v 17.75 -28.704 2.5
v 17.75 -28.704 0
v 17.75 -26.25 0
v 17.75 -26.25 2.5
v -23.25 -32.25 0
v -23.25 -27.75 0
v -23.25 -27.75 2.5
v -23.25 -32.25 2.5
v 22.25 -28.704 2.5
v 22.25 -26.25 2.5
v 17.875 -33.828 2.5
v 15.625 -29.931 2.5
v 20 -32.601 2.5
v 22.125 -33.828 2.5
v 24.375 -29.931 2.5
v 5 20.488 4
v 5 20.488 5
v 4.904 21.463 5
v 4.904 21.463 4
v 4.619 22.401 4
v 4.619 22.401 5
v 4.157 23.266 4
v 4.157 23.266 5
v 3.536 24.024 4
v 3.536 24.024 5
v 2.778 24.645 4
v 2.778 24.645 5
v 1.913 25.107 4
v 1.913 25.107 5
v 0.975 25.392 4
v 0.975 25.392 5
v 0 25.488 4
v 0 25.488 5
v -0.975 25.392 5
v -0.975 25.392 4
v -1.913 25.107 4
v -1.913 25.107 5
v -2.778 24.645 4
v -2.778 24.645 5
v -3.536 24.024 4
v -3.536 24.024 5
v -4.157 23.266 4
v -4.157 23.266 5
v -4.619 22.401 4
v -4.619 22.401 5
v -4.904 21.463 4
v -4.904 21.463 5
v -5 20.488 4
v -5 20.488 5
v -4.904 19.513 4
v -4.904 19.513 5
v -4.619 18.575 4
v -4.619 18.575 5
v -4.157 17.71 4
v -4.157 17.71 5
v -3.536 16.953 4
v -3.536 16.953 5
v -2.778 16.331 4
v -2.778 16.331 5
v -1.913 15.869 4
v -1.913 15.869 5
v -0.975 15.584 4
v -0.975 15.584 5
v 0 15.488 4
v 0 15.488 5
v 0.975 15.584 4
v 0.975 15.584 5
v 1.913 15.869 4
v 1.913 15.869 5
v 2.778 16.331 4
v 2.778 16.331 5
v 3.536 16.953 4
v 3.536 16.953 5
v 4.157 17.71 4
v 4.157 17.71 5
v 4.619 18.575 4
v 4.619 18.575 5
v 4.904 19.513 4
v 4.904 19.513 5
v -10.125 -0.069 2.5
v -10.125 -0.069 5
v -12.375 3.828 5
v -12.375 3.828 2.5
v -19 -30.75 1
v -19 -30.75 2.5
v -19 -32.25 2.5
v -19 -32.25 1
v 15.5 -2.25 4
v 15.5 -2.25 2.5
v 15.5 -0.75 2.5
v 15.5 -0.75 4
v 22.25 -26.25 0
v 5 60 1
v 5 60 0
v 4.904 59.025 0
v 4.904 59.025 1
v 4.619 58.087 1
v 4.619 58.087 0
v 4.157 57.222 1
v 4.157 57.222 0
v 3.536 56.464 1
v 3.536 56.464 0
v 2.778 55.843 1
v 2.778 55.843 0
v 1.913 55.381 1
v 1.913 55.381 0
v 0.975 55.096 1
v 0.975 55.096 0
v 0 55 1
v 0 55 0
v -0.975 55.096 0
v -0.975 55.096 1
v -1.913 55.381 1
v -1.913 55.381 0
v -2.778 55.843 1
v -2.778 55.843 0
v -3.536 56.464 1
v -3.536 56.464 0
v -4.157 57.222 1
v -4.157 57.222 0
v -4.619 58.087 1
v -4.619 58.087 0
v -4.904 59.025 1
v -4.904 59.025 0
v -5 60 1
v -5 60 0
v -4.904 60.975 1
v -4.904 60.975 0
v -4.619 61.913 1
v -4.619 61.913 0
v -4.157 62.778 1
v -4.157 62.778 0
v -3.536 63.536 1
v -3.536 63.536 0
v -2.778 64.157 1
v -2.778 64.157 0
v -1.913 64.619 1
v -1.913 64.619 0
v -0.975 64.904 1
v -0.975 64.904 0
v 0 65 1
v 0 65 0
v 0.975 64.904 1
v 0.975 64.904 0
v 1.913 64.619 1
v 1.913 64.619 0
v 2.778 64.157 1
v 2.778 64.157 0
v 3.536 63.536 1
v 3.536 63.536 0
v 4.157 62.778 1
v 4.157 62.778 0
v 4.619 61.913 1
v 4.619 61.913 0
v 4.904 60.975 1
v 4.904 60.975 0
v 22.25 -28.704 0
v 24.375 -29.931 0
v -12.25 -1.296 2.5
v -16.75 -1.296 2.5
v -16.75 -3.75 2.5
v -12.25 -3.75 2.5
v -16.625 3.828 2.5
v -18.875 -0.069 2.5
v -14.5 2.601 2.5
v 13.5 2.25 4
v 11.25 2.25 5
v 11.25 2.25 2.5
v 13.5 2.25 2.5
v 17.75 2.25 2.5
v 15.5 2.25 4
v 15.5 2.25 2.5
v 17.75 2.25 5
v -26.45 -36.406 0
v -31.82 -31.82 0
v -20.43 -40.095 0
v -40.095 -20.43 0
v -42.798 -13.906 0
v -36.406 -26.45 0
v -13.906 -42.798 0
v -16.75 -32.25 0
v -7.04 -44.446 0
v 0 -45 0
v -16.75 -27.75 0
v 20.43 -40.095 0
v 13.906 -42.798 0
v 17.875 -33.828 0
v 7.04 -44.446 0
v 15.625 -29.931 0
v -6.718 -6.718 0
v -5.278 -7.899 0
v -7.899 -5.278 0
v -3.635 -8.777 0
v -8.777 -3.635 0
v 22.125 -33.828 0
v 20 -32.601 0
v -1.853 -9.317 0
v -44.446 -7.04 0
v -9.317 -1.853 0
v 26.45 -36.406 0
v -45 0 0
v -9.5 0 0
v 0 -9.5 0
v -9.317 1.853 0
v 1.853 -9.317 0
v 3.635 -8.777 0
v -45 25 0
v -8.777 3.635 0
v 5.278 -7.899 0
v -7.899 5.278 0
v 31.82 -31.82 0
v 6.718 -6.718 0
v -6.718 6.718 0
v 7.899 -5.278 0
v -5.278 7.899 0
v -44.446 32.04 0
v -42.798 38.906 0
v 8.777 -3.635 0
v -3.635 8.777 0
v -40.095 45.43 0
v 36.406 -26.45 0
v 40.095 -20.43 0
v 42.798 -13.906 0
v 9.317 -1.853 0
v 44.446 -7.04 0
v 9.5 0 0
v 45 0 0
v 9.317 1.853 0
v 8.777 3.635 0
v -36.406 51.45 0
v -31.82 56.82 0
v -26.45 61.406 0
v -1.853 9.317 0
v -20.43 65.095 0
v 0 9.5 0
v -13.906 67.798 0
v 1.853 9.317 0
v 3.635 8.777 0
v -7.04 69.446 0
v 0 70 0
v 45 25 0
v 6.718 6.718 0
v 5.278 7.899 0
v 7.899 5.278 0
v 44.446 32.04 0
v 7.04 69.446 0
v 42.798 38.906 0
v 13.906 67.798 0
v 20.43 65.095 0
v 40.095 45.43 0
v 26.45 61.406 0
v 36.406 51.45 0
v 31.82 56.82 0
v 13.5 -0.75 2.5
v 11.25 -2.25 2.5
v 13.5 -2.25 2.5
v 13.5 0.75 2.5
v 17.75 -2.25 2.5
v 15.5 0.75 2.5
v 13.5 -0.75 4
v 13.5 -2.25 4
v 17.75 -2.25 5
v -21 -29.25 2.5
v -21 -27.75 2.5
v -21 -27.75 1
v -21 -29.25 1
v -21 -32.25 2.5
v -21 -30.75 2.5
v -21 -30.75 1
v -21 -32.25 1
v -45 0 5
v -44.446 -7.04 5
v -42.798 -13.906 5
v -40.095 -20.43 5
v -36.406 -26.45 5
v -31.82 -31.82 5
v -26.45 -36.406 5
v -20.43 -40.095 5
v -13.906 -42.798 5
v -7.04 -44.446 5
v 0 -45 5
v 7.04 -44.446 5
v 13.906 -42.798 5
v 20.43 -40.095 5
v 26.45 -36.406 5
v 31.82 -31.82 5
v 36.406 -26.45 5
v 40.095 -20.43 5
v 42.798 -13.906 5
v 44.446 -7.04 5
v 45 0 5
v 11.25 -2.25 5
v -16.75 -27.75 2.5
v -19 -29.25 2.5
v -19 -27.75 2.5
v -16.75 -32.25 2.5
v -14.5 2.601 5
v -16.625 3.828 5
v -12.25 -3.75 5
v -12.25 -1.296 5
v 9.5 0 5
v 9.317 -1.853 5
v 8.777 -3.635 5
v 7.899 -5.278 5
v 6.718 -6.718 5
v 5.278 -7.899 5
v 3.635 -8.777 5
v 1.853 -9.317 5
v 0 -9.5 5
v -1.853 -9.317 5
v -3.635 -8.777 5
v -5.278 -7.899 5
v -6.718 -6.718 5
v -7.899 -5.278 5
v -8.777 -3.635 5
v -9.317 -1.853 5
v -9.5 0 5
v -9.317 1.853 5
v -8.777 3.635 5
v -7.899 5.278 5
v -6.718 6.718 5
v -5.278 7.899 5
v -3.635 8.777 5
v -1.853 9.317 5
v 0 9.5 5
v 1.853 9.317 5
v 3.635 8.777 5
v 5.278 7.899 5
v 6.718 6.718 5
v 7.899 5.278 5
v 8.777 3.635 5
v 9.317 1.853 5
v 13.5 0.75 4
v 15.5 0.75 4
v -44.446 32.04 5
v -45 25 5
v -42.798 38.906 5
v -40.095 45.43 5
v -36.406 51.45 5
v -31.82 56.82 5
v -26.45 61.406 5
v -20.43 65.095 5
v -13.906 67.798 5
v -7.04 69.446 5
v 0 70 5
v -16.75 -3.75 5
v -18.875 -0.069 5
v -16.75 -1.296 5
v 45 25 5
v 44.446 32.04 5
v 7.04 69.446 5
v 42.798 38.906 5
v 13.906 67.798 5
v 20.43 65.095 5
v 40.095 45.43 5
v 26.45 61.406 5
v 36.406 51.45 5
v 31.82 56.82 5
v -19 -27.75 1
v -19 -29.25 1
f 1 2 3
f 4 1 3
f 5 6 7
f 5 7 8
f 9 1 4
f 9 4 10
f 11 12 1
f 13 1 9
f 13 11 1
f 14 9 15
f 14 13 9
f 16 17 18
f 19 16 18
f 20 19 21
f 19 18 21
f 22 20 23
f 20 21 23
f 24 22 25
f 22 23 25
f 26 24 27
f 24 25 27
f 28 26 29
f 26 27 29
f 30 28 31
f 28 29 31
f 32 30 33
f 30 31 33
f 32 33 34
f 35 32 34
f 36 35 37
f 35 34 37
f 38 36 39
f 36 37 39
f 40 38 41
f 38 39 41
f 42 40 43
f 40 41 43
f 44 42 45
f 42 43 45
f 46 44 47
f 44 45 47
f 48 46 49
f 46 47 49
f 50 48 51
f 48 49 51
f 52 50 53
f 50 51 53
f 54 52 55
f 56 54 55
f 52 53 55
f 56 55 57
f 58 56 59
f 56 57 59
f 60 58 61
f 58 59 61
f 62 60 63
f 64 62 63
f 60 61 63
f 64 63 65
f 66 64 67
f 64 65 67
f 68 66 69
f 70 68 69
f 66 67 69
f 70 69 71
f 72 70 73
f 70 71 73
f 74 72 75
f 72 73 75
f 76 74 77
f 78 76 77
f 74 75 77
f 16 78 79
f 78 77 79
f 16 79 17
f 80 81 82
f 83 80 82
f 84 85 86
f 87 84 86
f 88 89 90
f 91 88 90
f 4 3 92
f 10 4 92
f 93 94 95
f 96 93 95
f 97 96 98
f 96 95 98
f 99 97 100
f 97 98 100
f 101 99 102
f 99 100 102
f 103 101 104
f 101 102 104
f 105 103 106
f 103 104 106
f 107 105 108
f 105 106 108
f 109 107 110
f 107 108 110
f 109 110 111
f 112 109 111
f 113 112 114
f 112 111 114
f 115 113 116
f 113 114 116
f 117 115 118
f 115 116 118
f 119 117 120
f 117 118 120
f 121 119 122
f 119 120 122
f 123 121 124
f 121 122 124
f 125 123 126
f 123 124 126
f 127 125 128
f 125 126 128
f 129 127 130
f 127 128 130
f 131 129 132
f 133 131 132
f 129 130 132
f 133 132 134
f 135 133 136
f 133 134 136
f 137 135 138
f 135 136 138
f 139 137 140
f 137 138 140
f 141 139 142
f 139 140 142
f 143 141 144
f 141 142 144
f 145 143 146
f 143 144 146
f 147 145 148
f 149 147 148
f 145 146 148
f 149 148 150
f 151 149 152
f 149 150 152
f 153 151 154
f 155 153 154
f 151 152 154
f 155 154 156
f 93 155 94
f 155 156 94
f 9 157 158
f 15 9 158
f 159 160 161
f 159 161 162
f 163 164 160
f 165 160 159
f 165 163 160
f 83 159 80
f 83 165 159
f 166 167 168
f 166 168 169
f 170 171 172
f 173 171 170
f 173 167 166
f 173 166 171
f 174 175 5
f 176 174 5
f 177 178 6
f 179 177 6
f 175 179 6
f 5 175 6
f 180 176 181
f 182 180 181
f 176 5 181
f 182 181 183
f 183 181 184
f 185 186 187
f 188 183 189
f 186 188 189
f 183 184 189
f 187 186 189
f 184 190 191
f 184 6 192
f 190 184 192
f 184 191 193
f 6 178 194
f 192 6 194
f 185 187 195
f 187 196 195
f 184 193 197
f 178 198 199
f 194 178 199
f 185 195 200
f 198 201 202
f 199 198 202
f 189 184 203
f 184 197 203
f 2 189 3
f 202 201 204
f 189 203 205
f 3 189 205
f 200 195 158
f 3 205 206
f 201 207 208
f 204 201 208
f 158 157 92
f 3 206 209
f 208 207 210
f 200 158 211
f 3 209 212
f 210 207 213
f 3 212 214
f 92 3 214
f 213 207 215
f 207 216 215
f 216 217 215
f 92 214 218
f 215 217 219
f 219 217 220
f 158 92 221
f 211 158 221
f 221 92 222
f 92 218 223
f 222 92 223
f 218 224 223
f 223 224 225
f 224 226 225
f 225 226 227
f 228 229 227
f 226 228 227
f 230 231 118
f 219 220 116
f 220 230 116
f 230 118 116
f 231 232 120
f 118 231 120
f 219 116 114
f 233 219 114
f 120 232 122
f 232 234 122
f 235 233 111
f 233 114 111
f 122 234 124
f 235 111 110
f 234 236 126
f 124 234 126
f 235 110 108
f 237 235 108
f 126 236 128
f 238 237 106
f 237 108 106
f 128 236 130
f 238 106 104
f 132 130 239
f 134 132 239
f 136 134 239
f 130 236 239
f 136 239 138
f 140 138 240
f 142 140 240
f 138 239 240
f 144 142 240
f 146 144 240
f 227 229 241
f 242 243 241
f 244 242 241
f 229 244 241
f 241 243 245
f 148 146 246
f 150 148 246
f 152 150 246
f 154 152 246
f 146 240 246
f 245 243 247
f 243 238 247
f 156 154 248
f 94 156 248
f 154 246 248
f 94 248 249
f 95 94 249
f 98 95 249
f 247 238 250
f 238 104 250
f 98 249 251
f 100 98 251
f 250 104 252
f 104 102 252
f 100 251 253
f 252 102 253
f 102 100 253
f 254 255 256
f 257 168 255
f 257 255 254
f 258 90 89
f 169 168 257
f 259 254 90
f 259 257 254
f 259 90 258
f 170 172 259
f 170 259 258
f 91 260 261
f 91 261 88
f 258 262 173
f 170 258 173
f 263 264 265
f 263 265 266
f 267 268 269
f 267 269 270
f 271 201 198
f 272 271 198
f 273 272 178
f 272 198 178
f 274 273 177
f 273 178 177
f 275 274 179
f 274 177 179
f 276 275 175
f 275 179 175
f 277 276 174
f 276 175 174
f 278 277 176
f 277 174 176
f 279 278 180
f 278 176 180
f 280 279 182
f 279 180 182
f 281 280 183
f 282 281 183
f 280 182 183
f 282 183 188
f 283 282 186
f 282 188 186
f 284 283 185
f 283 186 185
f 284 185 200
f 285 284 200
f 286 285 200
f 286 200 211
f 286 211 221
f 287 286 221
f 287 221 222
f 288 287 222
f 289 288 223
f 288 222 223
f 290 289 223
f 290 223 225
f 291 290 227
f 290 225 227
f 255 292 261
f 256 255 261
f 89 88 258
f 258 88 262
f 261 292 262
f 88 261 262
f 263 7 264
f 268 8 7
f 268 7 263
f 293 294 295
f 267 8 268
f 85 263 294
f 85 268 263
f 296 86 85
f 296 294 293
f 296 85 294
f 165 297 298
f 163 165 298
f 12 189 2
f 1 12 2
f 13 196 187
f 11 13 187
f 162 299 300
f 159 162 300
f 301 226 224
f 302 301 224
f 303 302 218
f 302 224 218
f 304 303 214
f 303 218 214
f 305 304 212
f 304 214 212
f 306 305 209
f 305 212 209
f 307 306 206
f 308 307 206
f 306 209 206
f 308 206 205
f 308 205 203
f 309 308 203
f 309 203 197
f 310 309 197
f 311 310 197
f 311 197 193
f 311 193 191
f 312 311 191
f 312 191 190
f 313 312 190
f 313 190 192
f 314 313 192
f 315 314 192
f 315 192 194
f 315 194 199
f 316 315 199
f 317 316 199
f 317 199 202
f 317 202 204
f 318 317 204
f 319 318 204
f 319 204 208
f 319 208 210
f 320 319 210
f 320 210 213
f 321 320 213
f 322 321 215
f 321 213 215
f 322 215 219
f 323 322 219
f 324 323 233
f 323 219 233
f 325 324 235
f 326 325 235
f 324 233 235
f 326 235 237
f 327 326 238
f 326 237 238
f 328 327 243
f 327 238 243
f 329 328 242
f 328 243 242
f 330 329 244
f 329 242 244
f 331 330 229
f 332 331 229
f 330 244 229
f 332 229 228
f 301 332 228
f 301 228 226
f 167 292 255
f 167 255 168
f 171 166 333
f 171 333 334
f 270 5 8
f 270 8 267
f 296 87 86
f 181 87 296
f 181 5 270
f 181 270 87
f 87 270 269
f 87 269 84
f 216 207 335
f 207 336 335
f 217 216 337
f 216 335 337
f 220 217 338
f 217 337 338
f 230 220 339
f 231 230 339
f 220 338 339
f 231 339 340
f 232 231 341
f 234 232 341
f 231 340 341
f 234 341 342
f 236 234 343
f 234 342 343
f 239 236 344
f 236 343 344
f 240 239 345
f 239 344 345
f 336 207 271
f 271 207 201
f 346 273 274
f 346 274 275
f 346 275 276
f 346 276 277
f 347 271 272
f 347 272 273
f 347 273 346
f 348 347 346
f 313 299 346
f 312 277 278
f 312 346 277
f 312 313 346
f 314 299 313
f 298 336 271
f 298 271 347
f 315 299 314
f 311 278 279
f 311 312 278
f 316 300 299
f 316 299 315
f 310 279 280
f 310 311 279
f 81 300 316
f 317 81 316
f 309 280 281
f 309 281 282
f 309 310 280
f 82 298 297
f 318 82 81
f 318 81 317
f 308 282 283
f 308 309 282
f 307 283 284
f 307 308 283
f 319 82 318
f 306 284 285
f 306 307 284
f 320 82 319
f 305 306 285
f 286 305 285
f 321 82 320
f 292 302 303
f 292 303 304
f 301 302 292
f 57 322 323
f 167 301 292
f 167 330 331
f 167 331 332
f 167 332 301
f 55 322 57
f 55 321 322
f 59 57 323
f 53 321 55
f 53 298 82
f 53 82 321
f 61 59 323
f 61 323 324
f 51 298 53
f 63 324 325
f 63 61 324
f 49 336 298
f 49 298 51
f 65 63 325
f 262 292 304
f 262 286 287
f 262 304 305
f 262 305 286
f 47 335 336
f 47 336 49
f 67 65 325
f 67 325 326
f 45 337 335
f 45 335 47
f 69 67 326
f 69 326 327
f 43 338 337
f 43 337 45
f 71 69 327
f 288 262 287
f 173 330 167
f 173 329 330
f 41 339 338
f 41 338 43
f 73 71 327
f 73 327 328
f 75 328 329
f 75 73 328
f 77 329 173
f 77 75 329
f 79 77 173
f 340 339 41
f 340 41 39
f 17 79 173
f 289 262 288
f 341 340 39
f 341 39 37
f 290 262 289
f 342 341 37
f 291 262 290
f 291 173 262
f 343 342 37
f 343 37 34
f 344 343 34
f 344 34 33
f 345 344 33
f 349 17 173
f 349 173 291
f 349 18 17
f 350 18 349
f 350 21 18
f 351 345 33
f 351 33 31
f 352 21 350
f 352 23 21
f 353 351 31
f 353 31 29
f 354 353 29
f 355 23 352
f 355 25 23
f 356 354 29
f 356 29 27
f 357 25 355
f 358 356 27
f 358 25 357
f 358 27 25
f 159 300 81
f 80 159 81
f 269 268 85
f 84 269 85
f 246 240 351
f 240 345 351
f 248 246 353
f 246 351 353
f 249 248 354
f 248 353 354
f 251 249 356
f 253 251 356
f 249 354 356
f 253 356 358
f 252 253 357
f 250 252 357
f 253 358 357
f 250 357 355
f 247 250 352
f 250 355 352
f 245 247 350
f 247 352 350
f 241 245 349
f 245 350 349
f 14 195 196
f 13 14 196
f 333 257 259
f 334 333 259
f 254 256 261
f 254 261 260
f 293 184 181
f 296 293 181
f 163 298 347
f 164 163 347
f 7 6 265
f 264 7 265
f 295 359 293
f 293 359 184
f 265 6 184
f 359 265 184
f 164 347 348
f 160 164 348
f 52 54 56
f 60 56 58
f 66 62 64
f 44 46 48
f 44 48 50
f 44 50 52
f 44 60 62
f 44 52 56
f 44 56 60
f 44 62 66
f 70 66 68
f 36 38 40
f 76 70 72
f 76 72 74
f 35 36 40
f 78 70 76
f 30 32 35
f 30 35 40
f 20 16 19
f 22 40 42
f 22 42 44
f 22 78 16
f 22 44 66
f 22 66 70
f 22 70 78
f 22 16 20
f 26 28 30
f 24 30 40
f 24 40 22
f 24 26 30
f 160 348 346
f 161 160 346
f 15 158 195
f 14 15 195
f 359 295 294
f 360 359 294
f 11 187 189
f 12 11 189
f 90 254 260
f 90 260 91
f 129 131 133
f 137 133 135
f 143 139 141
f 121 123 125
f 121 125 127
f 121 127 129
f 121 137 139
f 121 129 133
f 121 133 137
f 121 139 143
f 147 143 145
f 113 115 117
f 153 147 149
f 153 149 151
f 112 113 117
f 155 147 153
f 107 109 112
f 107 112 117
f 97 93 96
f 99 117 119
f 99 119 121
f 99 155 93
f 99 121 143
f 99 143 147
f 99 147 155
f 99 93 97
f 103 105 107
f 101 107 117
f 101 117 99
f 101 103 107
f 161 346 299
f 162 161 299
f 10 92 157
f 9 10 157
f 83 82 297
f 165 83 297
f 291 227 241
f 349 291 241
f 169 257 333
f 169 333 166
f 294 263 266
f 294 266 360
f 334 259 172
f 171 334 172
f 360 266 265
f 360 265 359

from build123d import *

# Parameters (mm, degrees)
F1_DEPTH  = 5
F3_DEPTH  = 2.5
F4_W      = 6.5
F4_H      = 4.5
F5_DEPTH  = 2.5
F6_W      = 2
F6_H      = 1.5
F7_DEPTH  = 1.5
F8_R      = 5
F9_DEPTH  = 1
F10_R     = 9.5
F11_DEPTH = 10
F14_DEPTH = 2.5
F12_R     = 5
F15_DEPTH = 1
F16_W     = 6.5
F16_H     = 4.5
F17_DEPTH = 2.5
F18_W     = 2
F18_H     = 1.5
F19_DEPTH = 1.5
F20_R     = 44.99999


# Not quite as in the source:
# - a fillet or chamfer is up to 0.001 mm smaller than in the source, because OpenCascade refuses the exact size


with BuildPart() as f1:
    # F0 (on Top) → F1 (new body)
    with BuildSketch(Plane.XY):
        with BuildLine():
            Line((-45, 70), (-45, 0))
            ThreePointArc((-45, 0), (0, -45), (45, 0))
            Line((45, 0), (45, 70))
            Line((45, 70), (-45, 70))
        make_face()
    extrude(amount=F1_DEPTH)

    # F2 (on face) → F3 (cut)
    with BuildSketch(Plane.XY.offset(5)):
        Polygon((-14.5, 2.6008529611), (-16.625, 3.8277222831), (-18.875, -0.0693920339), (-16.75, -1.2962613559), (-16.75, -3.75), (-12.25, -3.75), (-12.25, -1.2962613559), (-10.125, -0.0693920339), (-12.375, 3.8277222831), align=None)
    extrude(amount=-F3_DEPTH, mode=Mode.SUBTRACT)

    # F4 (on face) → F5 (cut)
    with BuildSketch(Plane.XY.offset(5)):
        with Locations((14.5, 0)):
            Rectangle(F4_W, F4_H)
    extrude(amount=-F5_DEPTH, mode=Mode.SUBTRACT)

    # F6 (on face) → F7 (join)
    with BuildSketch(Plane.XY.offset(2.5)):
        with Locations((14.5, 1.5)):
            Rectangle(F6_W, F6_H)
        with Locations((14.5, -1.5)):
            Rectangle(F6_W, F6_H)
    extrude(amount=F7_DEPTH)

    # F8 (on face) → F9 (cut)
    with BuildSketch(Plane.XY.offset(5)):
        with Locations((0, 20.4880452948)):
            Circle(F8_R)
    extrude(amount=-F9_DEPTH, mode=Mode.SUBTRACT)

    # F10 (on face) → F11 (cut)
    with BuildSketch(Plane(origin=(0, 0, 0), x_dir=(1, 0, 0), z_dir=(0, 0, -1))):
        Circle(F10_R)
    extrude(amount=-F11_DEPTH, mode=Mode.SUBTRACT)

    # F13 (on face) → F14 (cut)
    with BuildSketch(Plane(origin=(0, 0, 0), x_dir=(1, 0, 0), z_dir=(0, 0, -1))):
        Polygon((20, 32.6008529611), (17.875, 33.8277222831), (15.625, 29.9306079661), (17.75, 28.7037386441), (17.75, 26.25), (22.25, 26.25), (22.25, 28.7037386441), (24.375, 29.9306079661), (22.125, 33.8277222831), align=None)
    extrude(amount=-F14_DEPTH, mode=Mode.SUBTRACT)

    # F12 (on face) → F15 (cut)
    with BuildSketch(Plane(origin=(0, 0, 0), x_dir=(1, 0, 0), z_dir=(0, 0, -1))):
        with Locations((0, -60)):
            Circle(F12_R)
    extrude(amount=-F15_DEPTH, mode=Mode.SUBTRACT)

    # F16 (on face) → F17 (cut)
    with BuildSketch(Plane(origin=(0, 0, 0), x_dir=(1, 0, 0), z_dir=(0, 0, -1))):
        with Locations((-20, 30)):
            Rectangle(F16_W, F16_H)
    extrude(amount=-F17_DEPTH, mode=Mode.SUBTRACT)

    # F18 (on face) → F19 (join)
    with BuildSketch(Plane(origin=(0, 0, 2.5), x_dir=(1, 0, 0), z_dir=(0, 0, -1))):
        with Locations((-20, 31.5)):
            Rectangle(F18_W, F18_H)
        with Locations((-20, 28.5)):
            Rectangle(F18_W, F18_H)
    extrude(amount=F19_DEPTH)

    # F20 (radius 45 in the source; OpenCascade refuses exactly that, so slightly less here)
    f20_edges = [f1.edges().sort_by_distance(p)[0] for p in [
        (-45, 70, 2.5),
        (45, 70, 2.5),
    ]]
    fillet(f20_edges, radius=F20_R)


solid = f1.part
